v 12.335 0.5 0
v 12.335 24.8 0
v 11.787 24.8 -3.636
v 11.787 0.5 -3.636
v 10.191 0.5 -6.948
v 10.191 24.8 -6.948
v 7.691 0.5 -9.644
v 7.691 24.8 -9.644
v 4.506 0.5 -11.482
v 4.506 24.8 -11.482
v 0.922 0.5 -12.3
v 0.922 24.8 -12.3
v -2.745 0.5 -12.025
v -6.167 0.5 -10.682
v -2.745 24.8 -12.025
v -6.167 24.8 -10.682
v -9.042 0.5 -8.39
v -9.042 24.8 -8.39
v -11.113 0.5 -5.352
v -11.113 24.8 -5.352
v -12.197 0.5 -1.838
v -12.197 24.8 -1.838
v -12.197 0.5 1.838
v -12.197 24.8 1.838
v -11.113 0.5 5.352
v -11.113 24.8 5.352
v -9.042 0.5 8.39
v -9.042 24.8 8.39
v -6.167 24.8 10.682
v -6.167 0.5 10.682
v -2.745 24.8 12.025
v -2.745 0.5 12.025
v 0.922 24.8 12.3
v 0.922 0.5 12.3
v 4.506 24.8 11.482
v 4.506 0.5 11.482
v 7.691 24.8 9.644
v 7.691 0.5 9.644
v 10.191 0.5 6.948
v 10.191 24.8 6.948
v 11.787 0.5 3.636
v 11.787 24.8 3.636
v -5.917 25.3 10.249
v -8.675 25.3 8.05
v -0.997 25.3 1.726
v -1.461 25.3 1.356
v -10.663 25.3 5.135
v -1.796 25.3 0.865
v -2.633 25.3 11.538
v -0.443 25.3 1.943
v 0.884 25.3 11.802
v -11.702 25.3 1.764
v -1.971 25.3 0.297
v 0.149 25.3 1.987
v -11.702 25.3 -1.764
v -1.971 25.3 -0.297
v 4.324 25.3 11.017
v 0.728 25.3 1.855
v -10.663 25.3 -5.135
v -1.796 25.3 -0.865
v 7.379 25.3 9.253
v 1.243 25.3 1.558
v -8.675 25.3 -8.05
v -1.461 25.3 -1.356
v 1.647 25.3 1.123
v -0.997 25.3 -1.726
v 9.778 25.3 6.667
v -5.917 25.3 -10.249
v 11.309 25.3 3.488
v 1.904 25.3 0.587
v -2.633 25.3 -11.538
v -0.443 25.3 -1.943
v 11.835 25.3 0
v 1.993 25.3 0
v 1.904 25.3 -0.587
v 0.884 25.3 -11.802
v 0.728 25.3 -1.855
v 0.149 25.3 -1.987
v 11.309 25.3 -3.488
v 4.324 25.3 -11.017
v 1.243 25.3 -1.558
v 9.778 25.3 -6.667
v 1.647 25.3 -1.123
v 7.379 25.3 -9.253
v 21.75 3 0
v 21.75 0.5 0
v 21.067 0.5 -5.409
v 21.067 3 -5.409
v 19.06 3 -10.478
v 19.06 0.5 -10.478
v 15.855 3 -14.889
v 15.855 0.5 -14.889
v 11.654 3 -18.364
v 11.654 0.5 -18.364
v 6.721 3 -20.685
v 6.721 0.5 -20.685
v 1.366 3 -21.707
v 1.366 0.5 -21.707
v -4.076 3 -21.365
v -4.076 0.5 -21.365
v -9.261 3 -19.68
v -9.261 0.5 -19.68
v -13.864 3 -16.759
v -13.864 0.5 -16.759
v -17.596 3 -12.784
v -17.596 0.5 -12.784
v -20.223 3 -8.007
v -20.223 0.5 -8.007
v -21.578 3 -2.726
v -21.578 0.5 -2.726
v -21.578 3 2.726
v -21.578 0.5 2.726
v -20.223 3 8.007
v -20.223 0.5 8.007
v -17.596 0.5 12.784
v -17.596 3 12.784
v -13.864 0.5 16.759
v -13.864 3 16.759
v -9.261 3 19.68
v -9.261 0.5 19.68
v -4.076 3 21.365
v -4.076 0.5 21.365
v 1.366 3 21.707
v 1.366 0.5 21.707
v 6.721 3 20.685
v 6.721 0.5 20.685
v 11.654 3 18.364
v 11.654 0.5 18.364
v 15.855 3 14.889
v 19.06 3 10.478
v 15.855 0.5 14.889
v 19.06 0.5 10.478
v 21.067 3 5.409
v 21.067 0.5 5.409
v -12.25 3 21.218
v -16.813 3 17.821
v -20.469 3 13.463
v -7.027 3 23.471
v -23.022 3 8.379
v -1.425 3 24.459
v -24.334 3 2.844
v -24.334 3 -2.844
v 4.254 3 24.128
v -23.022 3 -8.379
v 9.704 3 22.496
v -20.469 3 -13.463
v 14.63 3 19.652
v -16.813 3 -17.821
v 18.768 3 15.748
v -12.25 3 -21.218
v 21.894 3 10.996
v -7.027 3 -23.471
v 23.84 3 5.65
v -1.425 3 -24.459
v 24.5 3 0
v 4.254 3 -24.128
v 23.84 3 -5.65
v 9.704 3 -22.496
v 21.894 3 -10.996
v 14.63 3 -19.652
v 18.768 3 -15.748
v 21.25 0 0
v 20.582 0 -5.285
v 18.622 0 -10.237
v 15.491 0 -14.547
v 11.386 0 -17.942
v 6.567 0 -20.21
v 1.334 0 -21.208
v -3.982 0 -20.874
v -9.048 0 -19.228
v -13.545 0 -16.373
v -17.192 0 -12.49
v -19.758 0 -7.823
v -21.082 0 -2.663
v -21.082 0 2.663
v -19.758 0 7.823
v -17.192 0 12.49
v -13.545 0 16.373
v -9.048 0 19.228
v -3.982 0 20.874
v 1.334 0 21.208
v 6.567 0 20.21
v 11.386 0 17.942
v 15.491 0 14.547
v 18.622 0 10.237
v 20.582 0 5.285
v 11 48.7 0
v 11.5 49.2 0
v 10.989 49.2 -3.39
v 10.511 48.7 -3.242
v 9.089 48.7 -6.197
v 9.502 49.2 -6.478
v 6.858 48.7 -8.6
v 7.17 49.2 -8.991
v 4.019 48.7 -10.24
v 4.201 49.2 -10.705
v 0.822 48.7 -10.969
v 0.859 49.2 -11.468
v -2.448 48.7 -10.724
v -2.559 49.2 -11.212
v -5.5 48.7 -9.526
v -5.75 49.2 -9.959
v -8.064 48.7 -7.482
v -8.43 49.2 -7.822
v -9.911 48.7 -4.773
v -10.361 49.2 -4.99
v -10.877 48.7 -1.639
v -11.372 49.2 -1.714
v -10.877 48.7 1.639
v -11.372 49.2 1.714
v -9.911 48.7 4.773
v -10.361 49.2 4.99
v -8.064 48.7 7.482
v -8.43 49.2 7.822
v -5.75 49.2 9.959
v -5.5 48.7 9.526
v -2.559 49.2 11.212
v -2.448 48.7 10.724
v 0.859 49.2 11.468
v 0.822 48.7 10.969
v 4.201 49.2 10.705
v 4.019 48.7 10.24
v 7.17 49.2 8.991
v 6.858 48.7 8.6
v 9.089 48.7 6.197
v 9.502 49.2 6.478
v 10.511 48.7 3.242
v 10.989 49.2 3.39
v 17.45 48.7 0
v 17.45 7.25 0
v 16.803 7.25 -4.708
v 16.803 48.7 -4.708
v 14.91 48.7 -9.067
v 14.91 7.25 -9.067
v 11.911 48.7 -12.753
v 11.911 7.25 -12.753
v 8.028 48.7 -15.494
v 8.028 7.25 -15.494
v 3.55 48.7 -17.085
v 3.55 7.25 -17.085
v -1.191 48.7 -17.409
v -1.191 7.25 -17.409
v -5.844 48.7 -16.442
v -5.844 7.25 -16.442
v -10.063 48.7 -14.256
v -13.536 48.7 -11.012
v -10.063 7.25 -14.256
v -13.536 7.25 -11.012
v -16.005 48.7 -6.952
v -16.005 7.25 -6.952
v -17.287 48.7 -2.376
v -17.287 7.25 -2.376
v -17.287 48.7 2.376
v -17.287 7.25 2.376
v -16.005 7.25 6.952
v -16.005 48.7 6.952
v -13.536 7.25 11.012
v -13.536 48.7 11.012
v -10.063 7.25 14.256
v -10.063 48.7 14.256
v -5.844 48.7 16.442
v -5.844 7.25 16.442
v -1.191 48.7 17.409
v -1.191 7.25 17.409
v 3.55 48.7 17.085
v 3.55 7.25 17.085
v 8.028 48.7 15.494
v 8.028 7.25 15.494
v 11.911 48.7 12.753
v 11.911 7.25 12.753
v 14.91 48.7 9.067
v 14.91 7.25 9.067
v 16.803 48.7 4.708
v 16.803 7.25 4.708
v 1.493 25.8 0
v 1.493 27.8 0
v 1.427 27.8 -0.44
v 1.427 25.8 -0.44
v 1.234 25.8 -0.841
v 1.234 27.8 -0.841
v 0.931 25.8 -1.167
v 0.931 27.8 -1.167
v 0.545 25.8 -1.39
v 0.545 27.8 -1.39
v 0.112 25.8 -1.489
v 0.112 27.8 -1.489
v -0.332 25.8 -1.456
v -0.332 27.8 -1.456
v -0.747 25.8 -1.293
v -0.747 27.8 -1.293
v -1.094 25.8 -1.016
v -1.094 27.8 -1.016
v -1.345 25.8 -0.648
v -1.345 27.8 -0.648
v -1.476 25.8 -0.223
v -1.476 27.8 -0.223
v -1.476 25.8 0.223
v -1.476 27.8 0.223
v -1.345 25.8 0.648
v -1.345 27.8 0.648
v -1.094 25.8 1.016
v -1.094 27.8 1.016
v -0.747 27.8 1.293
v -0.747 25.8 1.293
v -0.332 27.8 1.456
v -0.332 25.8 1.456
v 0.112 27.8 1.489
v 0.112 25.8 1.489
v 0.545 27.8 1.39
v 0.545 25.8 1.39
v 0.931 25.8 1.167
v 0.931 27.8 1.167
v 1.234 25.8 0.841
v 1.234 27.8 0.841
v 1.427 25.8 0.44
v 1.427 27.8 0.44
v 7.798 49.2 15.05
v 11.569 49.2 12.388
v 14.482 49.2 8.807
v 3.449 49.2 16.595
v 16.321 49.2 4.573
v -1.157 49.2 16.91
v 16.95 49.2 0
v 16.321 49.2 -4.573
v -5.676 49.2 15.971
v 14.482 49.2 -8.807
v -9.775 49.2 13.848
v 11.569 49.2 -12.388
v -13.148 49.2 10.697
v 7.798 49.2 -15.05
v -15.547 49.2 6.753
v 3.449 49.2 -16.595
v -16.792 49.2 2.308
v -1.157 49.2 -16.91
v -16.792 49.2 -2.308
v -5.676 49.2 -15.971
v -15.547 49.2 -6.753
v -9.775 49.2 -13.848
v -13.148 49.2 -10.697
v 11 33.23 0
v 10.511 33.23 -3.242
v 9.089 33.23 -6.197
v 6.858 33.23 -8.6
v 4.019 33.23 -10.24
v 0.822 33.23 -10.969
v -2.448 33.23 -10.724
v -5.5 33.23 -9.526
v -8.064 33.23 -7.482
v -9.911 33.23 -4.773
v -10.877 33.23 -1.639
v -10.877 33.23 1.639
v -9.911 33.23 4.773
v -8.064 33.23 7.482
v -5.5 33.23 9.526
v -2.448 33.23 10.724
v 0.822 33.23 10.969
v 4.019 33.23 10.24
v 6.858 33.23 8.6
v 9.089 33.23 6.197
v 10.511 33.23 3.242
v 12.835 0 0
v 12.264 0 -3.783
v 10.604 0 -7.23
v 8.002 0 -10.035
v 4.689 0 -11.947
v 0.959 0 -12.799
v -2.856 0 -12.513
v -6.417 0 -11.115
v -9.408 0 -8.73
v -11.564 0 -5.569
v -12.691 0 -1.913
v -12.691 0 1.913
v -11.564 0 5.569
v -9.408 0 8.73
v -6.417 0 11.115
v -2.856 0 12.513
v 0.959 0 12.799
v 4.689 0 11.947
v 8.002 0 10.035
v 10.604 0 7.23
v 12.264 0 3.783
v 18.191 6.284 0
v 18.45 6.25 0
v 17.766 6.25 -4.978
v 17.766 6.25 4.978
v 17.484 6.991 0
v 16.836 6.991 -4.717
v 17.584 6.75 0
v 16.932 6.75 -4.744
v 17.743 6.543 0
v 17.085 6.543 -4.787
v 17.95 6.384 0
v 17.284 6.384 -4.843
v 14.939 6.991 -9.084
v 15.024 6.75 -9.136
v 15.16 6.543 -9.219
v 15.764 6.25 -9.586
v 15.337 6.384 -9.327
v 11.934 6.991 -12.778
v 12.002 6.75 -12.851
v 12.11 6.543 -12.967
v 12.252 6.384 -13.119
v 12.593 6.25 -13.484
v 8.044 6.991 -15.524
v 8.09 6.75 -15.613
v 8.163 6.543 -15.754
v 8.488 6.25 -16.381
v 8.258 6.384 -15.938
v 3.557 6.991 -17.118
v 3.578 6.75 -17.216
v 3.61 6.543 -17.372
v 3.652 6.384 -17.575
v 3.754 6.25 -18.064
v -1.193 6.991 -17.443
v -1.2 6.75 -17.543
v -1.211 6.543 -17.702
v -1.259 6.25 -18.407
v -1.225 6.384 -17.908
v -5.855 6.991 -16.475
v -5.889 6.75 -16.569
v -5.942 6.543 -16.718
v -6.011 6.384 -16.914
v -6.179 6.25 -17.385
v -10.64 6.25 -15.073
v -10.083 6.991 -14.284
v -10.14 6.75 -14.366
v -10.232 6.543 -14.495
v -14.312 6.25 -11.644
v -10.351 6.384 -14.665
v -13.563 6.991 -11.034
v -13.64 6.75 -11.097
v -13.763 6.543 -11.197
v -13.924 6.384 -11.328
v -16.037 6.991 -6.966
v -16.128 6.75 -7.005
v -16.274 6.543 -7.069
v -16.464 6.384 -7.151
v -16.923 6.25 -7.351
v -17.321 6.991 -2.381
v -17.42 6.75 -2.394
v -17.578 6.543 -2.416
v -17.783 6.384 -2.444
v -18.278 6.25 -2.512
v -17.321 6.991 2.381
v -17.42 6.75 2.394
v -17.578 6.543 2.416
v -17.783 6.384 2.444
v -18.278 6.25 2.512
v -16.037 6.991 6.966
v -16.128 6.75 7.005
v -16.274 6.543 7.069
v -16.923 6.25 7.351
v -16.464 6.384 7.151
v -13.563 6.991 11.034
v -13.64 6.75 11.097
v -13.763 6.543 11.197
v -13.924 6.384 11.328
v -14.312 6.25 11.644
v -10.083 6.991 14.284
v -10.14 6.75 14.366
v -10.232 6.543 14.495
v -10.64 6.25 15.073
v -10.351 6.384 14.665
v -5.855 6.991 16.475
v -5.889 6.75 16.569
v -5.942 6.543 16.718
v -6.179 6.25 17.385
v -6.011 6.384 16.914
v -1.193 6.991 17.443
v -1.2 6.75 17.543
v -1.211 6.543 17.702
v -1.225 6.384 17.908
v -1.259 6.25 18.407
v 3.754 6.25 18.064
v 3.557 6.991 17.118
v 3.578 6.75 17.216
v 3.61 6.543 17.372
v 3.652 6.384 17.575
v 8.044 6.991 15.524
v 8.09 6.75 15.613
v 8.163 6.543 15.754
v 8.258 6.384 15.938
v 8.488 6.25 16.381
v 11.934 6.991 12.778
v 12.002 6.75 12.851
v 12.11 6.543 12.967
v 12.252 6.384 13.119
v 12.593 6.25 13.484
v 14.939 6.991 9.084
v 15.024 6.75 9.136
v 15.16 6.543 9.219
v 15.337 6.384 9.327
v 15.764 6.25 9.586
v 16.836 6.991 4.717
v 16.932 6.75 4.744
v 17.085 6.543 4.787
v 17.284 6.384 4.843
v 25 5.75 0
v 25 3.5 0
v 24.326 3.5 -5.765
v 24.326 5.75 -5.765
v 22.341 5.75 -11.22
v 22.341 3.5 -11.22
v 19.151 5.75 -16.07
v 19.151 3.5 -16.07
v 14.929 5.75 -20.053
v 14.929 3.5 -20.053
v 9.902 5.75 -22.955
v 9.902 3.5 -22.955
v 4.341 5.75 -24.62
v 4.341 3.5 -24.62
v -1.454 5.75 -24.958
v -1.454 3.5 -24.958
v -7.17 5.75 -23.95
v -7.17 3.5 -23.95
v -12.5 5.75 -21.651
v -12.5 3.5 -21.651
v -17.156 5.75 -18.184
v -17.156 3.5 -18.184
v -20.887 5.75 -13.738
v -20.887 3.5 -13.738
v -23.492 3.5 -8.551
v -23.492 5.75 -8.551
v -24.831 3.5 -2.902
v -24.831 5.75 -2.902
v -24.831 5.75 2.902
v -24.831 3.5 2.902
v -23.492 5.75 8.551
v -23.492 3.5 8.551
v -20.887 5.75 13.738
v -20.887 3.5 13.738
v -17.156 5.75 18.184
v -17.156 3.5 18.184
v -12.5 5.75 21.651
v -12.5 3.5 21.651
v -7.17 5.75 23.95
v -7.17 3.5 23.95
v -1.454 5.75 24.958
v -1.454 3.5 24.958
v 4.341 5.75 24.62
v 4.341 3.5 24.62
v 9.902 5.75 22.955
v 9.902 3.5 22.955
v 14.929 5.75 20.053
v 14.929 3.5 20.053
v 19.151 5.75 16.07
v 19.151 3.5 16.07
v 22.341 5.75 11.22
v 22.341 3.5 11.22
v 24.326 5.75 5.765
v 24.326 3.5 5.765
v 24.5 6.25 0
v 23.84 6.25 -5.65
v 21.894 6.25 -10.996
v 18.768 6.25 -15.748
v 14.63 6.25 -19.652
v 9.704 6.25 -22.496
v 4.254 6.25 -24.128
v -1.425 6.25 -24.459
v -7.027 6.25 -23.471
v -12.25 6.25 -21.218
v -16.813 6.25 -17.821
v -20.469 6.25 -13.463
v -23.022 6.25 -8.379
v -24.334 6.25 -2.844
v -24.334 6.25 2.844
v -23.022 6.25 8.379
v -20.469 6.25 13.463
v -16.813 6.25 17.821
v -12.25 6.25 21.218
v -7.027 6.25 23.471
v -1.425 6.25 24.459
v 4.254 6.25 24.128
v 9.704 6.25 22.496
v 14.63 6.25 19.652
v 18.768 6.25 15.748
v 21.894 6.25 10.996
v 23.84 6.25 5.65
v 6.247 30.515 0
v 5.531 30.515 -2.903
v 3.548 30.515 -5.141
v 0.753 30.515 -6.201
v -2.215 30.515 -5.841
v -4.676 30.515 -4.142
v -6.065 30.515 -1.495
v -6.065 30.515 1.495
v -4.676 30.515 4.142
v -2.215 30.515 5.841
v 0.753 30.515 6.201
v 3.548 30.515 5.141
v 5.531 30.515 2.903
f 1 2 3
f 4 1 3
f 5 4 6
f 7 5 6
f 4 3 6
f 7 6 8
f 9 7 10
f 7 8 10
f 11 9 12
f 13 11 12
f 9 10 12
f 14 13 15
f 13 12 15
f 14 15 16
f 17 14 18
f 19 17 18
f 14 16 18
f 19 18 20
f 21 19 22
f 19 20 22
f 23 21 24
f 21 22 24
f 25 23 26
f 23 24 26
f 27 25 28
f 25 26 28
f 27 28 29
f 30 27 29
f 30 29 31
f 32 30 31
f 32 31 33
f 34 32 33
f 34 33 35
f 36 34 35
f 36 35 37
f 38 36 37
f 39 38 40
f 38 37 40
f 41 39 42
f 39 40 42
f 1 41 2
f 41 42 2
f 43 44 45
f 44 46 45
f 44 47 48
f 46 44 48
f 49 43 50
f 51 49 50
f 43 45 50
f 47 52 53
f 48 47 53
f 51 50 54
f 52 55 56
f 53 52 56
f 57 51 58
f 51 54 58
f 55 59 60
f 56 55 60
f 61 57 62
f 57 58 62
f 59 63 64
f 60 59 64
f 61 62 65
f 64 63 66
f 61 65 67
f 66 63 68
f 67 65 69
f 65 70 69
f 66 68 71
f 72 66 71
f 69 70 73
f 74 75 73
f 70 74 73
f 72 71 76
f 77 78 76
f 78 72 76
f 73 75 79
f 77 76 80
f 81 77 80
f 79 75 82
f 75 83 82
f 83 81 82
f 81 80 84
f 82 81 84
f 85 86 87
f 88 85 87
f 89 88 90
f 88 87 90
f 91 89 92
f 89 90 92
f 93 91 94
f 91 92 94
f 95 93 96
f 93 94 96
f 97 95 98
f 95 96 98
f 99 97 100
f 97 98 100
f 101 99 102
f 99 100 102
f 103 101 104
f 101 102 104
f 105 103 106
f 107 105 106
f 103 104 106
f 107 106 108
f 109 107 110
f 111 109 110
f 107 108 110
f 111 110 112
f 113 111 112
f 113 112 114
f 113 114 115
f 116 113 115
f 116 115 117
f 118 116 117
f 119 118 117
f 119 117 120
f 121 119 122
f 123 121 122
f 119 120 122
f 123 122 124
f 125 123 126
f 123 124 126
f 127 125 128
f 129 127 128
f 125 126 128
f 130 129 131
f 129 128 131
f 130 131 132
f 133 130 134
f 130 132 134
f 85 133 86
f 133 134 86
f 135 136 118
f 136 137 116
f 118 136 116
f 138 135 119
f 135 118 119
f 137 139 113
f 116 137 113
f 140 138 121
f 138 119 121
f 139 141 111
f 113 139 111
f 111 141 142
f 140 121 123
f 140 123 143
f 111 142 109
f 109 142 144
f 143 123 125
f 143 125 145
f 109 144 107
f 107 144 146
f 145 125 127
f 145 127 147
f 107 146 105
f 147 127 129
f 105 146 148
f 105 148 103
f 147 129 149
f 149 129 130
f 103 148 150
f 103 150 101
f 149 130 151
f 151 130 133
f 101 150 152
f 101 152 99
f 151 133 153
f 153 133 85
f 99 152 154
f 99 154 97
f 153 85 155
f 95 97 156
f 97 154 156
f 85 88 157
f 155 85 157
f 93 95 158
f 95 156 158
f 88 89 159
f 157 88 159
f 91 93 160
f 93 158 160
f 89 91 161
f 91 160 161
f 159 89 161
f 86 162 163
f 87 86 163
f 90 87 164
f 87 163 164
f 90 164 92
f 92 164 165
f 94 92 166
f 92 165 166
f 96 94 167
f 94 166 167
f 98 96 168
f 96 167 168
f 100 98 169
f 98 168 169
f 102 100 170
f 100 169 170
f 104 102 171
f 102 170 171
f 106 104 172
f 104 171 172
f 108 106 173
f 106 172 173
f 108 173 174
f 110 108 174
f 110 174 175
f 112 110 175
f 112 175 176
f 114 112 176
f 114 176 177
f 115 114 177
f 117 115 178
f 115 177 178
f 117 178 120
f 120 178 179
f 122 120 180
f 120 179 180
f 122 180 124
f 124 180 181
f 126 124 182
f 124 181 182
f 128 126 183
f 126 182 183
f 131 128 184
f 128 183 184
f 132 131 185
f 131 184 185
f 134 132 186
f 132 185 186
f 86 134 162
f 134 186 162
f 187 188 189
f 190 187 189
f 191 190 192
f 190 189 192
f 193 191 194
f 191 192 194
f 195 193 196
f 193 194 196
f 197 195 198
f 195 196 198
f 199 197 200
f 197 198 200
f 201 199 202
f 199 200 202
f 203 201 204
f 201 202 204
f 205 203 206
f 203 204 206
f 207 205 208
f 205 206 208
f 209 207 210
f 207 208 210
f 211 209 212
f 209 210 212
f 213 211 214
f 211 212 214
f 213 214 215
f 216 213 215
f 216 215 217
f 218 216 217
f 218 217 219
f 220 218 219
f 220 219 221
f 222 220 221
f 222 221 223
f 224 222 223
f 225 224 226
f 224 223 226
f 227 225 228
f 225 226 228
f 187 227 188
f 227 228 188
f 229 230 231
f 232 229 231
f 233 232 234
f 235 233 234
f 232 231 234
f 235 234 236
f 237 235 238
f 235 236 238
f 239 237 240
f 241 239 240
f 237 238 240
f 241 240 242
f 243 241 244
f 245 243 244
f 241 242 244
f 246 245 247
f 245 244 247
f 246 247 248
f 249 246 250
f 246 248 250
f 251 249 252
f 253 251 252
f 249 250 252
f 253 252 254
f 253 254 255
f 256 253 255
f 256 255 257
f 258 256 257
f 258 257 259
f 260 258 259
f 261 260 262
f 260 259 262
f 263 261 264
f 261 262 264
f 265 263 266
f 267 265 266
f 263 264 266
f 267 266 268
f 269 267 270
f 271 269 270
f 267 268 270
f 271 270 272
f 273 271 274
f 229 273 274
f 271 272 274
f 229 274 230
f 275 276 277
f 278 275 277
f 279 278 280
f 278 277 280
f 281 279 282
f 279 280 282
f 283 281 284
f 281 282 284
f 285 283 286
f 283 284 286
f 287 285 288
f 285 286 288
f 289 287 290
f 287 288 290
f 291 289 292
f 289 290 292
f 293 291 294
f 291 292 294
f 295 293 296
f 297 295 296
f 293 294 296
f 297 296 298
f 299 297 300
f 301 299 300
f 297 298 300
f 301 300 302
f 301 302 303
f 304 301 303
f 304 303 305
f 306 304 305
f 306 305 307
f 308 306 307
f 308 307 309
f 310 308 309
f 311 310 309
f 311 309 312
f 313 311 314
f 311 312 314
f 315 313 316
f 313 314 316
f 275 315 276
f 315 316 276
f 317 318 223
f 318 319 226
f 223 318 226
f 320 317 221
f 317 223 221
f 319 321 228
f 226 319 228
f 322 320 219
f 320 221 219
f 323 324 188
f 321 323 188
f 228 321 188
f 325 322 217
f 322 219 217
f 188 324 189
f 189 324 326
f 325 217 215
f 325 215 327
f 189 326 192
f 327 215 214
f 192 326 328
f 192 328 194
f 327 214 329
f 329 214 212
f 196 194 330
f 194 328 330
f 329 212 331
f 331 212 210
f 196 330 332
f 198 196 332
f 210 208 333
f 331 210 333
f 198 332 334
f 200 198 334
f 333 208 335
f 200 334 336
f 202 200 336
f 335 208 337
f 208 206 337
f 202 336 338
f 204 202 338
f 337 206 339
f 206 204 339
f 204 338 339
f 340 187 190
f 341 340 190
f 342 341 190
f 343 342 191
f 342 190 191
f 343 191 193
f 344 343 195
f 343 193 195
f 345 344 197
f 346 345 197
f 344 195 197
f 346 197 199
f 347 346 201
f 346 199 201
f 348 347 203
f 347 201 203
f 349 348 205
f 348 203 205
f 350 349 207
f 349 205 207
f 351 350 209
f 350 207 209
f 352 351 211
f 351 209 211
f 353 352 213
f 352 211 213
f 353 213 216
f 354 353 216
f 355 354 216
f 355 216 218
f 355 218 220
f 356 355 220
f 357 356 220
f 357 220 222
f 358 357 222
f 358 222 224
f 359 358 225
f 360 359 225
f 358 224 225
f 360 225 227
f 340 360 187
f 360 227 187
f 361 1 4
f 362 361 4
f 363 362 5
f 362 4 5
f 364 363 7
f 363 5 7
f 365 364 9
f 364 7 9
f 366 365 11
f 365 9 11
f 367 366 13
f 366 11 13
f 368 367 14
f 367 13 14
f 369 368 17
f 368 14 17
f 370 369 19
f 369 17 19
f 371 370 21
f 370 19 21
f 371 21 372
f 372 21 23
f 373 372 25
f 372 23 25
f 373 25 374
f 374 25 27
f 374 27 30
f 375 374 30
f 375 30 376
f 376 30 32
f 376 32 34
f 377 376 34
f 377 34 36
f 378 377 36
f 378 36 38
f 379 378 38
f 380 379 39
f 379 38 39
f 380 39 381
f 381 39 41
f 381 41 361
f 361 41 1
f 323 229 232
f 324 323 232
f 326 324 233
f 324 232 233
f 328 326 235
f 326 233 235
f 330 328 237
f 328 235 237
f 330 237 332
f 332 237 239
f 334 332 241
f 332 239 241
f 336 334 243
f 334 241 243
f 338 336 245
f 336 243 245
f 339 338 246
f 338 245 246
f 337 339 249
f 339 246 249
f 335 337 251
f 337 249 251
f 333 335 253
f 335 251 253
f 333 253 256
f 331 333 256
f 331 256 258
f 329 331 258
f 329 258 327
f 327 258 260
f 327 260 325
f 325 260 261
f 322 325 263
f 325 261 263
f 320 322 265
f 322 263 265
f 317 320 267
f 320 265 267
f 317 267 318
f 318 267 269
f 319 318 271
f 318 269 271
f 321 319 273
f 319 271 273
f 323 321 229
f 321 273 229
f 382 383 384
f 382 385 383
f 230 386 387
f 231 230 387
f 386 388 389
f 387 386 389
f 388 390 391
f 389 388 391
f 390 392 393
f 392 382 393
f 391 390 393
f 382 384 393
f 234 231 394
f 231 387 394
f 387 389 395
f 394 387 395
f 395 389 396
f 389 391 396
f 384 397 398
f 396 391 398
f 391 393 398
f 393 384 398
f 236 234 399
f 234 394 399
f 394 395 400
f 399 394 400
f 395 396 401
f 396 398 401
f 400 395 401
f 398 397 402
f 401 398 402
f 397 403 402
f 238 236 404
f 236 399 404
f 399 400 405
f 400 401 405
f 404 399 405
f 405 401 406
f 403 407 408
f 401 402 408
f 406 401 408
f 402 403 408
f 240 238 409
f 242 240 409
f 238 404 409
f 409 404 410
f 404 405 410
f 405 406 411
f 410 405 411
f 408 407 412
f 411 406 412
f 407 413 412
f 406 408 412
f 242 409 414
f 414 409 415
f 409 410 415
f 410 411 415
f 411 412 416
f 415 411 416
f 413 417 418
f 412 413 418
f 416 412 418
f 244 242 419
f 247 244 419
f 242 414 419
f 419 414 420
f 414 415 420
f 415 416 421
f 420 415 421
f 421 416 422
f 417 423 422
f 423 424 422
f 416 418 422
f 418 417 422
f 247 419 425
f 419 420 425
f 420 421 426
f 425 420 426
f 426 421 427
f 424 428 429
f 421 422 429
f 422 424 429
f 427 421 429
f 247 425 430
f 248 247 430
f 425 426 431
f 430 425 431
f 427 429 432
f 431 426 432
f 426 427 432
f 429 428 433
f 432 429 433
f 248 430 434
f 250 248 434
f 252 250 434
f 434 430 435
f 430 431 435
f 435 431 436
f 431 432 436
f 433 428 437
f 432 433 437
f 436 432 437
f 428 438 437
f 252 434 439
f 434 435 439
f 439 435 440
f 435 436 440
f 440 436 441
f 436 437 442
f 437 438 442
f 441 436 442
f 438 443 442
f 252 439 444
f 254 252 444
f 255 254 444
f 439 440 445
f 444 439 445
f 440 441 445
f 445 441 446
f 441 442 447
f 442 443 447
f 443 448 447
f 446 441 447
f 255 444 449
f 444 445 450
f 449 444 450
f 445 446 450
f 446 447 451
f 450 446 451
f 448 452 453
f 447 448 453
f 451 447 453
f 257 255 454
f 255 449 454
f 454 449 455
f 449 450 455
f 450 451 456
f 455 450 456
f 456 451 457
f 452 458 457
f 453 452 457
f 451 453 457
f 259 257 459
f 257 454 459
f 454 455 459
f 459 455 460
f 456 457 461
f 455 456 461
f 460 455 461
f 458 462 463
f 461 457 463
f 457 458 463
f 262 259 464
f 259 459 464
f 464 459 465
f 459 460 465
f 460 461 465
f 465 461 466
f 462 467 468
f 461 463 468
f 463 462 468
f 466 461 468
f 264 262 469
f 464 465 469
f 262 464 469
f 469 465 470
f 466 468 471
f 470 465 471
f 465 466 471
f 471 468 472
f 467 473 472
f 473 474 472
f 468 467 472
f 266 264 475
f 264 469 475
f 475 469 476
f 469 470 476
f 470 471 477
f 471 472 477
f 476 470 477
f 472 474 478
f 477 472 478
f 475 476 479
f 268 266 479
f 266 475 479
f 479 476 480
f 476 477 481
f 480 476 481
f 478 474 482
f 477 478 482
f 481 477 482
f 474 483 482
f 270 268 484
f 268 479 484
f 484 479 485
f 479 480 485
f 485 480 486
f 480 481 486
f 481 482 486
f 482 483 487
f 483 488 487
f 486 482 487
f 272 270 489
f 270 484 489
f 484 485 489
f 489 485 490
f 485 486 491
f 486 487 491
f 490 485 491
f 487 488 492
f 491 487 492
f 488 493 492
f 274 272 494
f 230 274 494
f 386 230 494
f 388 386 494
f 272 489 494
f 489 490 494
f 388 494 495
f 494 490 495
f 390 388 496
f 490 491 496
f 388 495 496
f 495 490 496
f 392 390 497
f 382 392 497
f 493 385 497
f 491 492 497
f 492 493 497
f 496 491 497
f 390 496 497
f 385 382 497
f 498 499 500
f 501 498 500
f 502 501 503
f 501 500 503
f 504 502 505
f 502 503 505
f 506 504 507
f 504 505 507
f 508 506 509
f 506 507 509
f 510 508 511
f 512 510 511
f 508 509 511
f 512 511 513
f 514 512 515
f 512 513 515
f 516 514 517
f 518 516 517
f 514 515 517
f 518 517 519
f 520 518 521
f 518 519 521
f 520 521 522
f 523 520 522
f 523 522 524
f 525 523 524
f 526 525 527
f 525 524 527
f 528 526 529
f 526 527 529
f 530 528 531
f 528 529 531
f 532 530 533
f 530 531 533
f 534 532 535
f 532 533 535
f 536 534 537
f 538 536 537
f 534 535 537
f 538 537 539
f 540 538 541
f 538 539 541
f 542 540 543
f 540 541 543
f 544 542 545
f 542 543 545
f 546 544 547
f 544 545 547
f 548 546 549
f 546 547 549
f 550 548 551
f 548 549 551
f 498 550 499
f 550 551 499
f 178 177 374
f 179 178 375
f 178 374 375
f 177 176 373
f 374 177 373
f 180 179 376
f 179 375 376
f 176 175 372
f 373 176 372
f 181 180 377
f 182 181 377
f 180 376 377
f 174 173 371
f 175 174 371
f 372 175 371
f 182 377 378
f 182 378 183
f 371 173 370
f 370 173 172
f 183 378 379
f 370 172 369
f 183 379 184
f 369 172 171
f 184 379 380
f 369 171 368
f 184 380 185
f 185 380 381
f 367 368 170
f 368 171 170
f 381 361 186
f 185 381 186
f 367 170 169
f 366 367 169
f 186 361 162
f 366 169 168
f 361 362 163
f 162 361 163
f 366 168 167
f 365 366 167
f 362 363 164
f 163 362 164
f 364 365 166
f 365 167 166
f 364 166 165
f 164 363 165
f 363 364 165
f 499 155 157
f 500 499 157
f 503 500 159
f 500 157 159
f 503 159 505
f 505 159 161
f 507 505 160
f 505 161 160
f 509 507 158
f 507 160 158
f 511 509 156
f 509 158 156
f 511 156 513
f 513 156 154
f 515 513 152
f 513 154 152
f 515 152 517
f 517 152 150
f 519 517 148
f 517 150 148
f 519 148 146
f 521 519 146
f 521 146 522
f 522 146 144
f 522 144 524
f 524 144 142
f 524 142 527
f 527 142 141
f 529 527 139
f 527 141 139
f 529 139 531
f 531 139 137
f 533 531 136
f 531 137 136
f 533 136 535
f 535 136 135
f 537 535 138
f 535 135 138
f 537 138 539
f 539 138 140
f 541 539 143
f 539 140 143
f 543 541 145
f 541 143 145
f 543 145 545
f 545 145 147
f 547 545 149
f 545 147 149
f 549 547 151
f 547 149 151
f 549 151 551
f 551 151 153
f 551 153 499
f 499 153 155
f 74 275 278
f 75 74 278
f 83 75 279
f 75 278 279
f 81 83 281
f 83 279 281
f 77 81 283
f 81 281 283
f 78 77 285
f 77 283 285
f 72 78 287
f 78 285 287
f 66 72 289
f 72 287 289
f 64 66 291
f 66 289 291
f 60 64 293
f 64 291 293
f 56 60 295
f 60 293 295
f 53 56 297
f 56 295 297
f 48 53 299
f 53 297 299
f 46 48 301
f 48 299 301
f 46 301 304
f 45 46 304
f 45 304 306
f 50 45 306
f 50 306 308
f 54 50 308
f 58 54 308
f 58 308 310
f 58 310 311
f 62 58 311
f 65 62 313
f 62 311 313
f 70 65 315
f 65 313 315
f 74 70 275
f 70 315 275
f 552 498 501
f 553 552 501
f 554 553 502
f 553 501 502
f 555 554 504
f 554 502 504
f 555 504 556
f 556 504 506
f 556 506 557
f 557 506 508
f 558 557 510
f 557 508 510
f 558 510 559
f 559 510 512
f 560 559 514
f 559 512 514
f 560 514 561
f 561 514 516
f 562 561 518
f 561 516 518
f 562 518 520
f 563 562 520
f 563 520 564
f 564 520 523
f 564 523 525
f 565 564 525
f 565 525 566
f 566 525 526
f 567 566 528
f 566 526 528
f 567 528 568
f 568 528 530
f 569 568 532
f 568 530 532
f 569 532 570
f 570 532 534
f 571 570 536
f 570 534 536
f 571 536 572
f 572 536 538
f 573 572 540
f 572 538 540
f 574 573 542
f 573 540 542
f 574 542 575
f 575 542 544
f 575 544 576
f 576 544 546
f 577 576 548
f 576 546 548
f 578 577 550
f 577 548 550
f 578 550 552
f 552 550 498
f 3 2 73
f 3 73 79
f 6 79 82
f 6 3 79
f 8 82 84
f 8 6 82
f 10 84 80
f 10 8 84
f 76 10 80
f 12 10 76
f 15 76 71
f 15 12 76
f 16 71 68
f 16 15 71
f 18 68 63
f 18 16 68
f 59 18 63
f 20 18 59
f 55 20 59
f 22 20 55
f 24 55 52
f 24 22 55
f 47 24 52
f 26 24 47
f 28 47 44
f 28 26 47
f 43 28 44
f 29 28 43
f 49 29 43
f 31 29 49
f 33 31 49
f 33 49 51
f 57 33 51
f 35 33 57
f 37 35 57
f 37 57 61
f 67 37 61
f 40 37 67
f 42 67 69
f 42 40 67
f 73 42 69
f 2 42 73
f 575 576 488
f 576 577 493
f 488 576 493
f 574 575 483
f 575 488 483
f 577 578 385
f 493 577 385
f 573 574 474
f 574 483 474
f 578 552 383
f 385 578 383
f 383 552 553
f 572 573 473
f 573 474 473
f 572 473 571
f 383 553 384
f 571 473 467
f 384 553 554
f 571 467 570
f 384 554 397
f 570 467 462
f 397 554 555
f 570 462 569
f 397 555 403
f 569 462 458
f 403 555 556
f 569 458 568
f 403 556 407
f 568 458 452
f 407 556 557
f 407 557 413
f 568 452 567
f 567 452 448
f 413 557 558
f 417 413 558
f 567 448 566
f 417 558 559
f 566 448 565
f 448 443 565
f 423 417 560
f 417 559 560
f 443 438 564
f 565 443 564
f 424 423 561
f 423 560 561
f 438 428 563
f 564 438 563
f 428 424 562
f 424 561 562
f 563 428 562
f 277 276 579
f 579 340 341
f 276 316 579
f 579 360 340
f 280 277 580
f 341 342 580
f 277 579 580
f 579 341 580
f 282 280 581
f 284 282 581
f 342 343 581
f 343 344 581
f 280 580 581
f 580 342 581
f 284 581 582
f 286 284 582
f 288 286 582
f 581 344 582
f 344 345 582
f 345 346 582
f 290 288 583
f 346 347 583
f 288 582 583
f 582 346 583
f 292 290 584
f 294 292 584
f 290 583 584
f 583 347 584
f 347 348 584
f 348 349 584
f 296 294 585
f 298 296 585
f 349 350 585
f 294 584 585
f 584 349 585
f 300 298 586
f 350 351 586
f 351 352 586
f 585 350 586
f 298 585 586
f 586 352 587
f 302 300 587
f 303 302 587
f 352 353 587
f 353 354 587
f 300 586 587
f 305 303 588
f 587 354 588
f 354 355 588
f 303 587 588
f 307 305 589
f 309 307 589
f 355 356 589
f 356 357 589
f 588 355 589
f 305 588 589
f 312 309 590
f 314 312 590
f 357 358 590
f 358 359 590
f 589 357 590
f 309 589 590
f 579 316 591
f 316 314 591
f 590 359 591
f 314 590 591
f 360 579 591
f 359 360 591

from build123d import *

# Parameters (mm, degrees)
CHAMFER1_SIZE = 0.5
FILLET1_R     = 1
CHAMFER2_SIZE = 0.5


with BuildPart() as part:
    # Sketch1 → Revolve1 (revolve)
    with BuildSketch(Plane.XY):
        Polygon((1.493038446, 27.8), (11, 33.23), (11, 49.2), (17.45, 49.2), (17.45, 6.25), (25, 6.25), (25, 3), (21.75, 3), (21.75, 0), (12.334639896, 0), (12.334639896, 25.3), (1.493038446, 25.3), align=None)
    revolve(axis=Axis((0, 0, 0), (0, 1, 0)))

    # Chamfer1
    chamfer1_edges = [part.edges().sort_by_distance(p)[0] for p in [
        (-11, 49.2, 0),
        (-17.45, 49.2, 0),
        (-25, 6.25, 0),
        (-25, 3, 0),
        (-21.75, 0, 0),
        (-12.334639896, 0, 0),
        (-1.493038446, 25.3, 0),
    ]]
    chamfer(chamfer1_edges, length=CHAMFER1_SIZE)

    # Fillet1
    fillet1_edges = [part.edges().sort_by_distance(p)[0] for p in [
        (-17.45, 6.25, 0),
    ]]
    fillet(fillet1_edges, radius=FILLET1_R)

    # Chamfer2
    chamfer2_edges = [part.edges().sort_by_distance(p)[0] for p in [
        (-12.334639896, 25.3, 0),
    ]]
    chamfer(chamfer2_edges, length=CHAMFER2_SIZE)


solid = part.part
